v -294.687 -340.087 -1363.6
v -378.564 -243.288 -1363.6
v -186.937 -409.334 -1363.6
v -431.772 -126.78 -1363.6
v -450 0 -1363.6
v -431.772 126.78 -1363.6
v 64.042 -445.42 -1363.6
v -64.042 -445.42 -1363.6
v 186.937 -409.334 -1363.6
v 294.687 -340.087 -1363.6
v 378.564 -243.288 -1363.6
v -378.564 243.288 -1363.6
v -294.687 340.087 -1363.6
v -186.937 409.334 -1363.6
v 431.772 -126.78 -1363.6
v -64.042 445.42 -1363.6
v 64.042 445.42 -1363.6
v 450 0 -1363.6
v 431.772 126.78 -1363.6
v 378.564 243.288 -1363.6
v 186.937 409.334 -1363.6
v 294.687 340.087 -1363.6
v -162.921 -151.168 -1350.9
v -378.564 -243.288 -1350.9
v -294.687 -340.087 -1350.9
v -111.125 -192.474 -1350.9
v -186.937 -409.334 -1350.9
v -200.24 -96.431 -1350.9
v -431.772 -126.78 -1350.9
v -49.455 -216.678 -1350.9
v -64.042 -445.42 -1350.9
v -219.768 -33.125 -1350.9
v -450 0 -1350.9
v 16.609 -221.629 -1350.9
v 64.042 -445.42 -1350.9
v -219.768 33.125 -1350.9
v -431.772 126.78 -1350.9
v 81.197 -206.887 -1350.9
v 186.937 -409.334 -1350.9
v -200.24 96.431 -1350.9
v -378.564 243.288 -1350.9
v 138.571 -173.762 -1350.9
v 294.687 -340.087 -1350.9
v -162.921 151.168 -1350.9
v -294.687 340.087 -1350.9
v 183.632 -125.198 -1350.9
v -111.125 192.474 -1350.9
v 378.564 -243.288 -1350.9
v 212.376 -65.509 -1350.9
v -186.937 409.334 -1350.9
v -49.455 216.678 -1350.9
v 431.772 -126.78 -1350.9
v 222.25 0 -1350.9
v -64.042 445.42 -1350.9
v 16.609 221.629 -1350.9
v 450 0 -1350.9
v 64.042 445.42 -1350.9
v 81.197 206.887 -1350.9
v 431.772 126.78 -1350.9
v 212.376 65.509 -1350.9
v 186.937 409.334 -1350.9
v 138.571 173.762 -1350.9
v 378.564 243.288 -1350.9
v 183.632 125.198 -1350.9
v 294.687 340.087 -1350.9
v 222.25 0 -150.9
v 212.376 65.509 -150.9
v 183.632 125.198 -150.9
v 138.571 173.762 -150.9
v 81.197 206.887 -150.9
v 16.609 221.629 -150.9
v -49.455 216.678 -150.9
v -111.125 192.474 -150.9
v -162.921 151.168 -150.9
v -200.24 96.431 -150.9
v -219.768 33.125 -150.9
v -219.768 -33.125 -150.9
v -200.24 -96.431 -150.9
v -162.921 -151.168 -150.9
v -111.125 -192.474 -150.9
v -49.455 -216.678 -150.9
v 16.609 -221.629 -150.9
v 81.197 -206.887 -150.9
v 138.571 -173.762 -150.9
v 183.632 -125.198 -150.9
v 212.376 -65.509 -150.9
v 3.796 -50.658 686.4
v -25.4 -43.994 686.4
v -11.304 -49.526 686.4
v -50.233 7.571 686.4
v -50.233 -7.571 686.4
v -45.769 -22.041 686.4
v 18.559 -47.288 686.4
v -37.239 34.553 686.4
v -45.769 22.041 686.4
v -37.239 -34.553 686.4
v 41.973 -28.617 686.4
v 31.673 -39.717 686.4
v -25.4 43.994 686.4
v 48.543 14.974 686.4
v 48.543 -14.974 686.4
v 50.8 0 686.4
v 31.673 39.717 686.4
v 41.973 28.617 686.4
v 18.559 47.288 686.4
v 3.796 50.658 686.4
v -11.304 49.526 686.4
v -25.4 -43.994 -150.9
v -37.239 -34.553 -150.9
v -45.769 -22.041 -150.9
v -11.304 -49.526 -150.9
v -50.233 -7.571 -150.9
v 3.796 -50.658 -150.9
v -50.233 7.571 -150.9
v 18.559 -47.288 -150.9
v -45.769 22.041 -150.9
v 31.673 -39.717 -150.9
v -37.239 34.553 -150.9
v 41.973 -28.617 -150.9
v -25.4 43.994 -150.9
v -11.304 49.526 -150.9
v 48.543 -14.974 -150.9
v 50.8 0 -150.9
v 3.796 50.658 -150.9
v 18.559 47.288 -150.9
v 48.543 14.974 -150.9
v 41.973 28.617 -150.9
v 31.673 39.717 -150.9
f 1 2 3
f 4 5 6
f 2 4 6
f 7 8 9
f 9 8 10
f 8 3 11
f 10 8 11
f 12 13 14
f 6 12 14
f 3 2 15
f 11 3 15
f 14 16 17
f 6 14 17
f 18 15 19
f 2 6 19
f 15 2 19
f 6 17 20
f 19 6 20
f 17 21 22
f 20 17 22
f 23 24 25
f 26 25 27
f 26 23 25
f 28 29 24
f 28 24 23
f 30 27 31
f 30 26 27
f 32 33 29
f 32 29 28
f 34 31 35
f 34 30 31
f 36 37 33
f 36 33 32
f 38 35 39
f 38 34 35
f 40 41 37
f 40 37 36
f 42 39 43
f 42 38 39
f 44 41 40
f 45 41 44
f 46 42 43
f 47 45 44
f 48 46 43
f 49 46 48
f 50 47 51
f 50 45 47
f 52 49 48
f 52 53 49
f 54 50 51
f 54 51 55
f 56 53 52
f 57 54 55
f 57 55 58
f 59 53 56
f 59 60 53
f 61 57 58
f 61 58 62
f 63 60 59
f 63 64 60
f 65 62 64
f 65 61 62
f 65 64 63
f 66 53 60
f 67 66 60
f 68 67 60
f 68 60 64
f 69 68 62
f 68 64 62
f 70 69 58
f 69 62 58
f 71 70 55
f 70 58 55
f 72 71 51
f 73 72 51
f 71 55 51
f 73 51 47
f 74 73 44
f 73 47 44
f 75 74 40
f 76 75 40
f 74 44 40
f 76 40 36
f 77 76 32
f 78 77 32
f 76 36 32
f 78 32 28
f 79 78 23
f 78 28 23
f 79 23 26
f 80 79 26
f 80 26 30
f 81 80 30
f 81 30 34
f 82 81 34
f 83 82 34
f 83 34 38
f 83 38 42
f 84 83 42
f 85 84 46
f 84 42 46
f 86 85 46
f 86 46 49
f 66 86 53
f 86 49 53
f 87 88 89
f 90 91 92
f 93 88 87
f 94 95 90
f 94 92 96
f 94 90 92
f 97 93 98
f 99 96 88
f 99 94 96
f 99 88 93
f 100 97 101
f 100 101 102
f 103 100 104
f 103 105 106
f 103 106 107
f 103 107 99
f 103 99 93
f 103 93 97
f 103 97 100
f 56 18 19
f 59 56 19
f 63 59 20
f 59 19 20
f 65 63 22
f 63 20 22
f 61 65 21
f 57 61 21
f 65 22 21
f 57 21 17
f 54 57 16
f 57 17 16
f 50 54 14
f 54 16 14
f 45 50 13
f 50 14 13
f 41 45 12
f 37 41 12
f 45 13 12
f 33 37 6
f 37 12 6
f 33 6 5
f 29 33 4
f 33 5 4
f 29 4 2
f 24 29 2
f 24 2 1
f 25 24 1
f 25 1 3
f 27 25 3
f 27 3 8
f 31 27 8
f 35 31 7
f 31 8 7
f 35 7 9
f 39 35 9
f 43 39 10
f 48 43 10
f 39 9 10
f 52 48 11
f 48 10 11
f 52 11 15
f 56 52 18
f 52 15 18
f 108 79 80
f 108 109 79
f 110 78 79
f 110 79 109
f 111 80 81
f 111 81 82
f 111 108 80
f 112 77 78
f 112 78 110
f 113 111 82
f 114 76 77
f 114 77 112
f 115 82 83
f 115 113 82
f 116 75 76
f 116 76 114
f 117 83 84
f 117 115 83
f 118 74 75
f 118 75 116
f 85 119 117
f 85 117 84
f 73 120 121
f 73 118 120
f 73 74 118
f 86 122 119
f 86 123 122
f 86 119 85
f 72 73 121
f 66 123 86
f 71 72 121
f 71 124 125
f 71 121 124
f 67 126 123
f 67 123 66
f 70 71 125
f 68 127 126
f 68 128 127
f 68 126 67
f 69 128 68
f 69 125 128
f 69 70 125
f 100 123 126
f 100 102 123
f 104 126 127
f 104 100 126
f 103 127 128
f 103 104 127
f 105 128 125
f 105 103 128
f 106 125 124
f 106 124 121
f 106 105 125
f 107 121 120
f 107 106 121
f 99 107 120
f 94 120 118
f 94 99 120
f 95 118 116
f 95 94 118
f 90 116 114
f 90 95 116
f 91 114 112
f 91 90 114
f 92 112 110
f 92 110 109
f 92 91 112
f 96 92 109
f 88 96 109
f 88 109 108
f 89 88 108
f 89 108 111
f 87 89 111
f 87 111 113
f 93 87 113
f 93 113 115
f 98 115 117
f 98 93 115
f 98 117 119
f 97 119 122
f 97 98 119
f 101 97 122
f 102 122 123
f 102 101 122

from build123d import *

# Parameters (mm, degrees)
SKETCH1_R                = 50.8
BOSS_EXTRUDE1_DEPTH      = 686.4
BOSS_EXTRUDE1_DEPTH_BACK = 1363.6
SKETCH2_R                = 450
BOSS_EXTRUDE2_DEPTH      = 12.7
SKETCH3_R                = 222.25
BOSS_EXTRUDE3_DEPTH      = 1200


with BuildPart() as part:
    # Sketch1 → Boss-Extrude1 (new body, two sides)
    with BuildSketch(Plane.XY) as boss_extrude1_sk:
        Circle(SKETCH1_R)
    extrude(amount=BOSS_EXTRUDE1_DEPTH)
    extrude(boss_extrude1_sk.sketch, amount=-BOSS_EXTRUDE1_DEPTH_BACK)

    # Sketch2 → Boss-Extrude2 (add)
    with BuildSketch(Plane.XY.offset(-1363.6)):
        Circle(SKETCH2_R)
    extrude(amount=BOSS_EXTRUDE2_DEPTH)

    # Sketch3 → Boss-Extrude3 (add)
    with BuildSketch(Plane.XY.offset(-1350.9)):
        Circle(SKETCH3_R)
    extrude(amount=BOSS_EXTRUDE3_DEPTH)


solid = part.part
